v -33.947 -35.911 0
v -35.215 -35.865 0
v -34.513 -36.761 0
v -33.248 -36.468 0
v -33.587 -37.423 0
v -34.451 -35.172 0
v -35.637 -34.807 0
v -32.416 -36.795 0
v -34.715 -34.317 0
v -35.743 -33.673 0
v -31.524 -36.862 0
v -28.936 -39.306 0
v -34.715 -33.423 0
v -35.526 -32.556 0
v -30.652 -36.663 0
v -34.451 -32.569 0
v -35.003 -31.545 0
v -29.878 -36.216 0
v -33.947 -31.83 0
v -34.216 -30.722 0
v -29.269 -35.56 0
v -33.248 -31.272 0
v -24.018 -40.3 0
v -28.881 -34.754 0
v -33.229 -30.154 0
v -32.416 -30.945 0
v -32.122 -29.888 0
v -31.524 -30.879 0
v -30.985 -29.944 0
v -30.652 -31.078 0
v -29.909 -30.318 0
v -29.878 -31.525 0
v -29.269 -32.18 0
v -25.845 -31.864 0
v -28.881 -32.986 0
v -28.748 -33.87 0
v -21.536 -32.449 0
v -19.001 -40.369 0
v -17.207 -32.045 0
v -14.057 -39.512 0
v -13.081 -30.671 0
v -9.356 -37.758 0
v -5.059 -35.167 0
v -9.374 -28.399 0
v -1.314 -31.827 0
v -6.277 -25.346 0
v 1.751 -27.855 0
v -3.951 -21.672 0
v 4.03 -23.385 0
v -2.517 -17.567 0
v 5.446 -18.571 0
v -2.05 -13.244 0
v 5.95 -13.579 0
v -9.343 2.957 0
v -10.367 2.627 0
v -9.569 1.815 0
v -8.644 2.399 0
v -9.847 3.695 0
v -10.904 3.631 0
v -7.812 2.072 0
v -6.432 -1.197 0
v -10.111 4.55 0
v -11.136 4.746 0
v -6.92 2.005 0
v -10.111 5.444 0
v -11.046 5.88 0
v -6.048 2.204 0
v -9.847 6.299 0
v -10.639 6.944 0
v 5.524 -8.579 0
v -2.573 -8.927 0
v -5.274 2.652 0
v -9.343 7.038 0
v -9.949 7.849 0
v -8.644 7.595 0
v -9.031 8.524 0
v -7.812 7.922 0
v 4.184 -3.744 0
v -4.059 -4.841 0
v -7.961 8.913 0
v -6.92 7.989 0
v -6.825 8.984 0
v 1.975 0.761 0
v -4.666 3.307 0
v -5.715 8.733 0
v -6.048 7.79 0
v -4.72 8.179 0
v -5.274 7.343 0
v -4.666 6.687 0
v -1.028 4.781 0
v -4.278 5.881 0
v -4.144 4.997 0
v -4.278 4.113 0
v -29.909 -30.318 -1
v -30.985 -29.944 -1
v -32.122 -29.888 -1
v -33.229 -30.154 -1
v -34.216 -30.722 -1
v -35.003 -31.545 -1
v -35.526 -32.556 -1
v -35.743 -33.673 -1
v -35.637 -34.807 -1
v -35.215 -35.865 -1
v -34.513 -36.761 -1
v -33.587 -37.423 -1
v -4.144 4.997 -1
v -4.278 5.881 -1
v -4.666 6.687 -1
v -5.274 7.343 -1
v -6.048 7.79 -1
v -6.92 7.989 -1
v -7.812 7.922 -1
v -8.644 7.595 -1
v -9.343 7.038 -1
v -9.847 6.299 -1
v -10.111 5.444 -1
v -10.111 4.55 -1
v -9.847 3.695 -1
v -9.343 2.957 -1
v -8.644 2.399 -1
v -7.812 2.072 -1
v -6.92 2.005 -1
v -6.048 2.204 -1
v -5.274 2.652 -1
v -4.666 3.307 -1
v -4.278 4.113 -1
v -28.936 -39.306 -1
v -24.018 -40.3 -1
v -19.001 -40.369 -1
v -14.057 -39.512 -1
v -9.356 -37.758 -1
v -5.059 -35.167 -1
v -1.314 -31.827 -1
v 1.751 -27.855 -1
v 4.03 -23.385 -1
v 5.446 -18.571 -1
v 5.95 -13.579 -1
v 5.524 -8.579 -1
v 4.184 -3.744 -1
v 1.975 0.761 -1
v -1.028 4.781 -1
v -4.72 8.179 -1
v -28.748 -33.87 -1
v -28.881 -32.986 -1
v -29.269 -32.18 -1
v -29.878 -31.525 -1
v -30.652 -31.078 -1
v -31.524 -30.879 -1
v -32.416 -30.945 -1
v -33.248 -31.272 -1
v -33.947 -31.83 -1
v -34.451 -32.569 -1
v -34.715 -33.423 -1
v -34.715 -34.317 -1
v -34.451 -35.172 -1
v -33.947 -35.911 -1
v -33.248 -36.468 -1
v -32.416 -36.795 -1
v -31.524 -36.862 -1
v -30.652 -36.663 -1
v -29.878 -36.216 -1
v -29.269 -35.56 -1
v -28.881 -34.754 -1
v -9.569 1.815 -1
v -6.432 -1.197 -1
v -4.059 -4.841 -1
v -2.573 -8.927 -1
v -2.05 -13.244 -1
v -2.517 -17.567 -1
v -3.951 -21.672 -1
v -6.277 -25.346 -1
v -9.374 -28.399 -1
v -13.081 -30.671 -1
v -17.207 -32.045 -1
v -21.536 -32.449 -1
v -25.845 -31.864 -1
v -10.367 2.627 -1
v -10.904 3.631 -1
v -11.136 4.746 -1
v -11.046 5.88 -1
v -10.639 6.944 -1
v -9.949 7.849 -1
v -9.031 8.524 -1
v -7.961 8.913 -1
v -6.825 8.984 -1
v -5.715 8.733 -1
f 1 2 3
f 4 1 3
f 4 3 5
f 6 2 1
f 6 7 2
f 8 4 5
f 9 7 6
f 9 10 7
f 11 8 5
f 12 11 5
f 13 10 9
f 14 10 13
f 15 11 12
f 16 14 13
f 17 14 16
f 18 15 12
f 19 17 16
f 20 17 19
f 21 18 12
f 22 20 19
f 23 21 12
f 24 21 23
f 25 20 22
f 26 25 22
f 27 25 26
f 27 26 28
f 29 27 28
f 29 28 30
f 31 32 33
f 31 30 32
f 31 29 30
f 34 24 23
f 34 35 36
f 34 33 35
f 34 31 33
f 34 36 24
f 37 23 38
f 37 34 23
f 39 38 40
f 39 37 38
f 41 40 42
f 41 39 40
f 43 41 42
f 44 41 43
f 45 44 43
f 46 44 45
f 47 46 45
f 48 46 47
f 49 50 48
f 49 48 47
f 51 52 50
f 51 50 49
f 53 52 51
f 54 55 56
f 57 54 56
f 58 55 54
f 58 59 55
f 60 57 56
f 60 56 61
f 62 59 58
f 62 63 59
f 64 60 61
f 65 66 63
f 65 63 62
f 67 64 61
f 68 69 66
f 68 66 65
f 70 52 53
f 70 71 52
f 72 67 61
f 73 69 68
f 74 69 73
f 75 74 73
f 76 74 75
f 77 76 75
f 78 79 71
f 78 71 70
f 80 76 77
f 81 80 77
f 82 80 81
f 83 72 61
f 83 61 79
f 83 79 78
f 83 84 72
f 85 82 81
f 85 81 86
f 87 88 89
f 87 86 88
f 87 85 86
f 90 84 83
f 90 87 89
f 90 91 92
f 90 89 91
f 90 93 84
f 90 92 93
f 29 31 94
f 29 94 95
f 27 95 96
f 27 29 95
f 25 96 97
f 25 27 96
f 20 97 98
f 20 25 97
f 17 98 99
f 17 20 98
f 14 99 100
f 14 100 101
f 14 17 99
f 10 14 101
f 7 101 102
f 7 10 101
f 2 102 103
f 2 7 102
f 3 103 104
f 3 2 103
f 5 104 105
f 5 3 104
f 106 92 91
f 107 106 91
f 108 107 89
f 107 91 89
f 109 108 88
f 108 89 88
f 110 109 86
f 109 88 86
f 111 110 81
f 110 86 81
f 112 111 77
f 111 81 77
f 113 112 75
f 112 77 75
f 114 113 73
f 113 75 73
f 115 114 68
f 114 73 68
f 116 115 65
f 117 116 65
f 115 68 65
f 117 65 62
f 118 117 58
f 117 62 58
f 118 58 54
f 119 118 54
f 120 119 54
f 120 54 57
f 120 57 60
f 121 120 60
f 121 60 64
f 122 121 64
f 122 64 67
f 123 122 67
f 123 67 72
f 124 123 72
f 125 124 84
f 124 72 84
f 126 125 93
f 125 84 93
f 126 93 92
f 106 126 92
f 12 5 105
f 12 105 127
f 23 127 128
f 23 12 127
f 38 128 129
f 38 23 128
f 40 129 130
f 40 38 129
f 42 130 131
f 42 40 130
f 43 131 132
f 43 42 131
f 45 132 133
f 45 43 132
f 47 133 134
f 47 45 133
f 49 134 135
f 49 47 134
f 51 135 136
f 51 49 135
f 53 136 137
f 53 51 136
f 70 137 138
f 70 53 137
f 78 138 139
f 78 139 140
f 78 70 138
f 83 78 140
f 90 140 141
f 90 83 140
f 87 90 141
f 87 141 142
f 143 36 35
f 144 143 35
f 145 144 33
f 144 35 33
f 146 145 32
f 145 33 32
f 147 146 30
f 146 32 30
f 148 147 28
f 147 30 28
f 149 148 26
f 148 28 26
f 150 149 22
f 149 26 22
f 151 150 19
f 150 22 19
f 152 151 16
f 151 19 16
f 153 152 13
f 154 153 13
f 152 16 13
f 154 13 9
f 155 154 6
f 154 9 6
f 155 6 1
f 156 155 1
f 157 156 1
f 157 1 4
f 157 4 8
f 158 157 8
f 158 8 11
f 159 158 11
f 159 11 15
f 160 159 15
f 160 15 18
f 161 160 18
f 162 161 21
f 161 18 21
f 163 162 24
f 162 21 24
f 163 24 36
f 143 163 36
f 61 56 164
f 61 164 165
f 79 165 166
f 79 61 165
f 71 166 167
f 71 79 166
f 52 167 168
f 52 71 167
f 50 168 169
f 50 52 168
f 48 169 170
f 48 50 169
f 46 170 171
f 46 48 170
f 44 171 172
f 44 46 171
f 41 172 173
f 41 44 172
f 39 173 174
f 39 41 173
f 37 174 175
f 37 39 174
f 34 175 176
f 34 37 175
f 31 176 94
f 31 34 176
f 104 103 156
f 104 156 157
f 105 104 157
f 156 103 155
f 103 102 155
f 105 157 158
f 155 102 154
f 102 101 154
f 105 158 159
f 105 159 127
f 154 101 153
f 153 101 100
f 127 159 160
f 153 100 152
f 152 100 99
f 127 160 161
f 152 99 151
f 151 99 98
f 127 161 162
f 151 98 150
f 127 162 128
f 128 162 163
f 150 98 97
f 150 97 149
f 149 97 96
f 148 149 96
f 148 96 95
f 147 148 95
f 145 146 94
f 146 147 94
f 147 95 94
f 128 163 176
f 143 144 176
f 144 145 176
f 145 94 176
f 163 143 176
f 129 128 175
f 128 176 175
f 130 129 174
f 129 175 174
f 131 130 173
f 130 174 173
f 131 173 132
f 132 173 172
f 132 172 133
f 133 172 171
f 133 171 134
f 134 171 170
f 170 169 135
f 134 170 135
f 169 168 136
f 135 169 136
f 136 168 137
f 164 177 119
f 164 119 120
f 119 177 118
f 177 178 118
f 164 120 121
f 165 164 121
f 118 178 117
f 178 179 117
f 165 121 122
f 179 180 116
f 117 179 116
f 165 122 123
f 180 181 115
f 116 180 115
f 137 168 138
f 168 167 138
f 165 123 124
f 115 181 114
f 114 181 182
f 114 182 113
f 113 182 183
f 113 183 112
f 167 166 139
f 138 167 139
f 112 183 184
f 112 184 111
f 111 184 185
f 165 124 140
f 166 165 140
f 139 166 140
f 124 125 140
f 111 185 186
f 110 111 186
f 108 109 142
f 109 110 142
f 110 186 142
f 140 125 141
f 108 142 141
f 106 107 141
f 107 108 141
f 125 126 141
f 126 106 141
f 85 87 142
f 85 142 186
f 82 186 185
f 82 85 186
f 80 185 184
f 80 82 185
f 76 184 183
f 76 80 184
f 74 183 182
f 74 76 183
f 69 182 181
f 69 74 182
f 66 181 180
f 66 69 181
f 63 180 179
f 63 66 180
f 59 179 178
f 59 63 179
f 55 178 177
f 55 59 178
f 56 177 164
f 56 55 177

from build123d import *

# Parameters (mm, degrees)
ESQUISSE1_R               = 3
T_LE_DE_BASE_PLI_E1_DEPTH = 1


# Sheet-metal steps are written as plain solids
with BuildPart() as part:
    # Esquisse1 → Tôle de base pliée1 (new body)
    with BuildSketch(Plane.XY):
        with BuildLine():
            ThreePointArc((-33.586634848, -37.422563624), (1.75063467, -27.854557121), (-4.720147653, 8.178737781))
            ThreePointArc((-4.720147653, 8.178737781), (-10.326052384, 7.421220682), (-9.568535285, 1.815315952))
            ThreePointArc((-9.568535285, 1.815315952), (-5.008878396, -23.575657367), (-29.909395263, -30.317782906))
            ThreePointArc((-29.909395263, -30.317782906), (-35.300405414, -32.031553473), (-33.586634848, -37.422563624))
        make_face()
        with Locations((-31.748015055, -33.870173265)):
            Circle(ESQUISSE1_R, mode=Mode.SUBTRACT)
        with Locations((-7.144341469, 4.997026867)):
            Circle(ESQUISSE1_R, mode=Mode.SUBTRACT)
    extrude(amount=-T_LE_DE_BASE_PLI_E1_DEPTH)


solid = part.part
